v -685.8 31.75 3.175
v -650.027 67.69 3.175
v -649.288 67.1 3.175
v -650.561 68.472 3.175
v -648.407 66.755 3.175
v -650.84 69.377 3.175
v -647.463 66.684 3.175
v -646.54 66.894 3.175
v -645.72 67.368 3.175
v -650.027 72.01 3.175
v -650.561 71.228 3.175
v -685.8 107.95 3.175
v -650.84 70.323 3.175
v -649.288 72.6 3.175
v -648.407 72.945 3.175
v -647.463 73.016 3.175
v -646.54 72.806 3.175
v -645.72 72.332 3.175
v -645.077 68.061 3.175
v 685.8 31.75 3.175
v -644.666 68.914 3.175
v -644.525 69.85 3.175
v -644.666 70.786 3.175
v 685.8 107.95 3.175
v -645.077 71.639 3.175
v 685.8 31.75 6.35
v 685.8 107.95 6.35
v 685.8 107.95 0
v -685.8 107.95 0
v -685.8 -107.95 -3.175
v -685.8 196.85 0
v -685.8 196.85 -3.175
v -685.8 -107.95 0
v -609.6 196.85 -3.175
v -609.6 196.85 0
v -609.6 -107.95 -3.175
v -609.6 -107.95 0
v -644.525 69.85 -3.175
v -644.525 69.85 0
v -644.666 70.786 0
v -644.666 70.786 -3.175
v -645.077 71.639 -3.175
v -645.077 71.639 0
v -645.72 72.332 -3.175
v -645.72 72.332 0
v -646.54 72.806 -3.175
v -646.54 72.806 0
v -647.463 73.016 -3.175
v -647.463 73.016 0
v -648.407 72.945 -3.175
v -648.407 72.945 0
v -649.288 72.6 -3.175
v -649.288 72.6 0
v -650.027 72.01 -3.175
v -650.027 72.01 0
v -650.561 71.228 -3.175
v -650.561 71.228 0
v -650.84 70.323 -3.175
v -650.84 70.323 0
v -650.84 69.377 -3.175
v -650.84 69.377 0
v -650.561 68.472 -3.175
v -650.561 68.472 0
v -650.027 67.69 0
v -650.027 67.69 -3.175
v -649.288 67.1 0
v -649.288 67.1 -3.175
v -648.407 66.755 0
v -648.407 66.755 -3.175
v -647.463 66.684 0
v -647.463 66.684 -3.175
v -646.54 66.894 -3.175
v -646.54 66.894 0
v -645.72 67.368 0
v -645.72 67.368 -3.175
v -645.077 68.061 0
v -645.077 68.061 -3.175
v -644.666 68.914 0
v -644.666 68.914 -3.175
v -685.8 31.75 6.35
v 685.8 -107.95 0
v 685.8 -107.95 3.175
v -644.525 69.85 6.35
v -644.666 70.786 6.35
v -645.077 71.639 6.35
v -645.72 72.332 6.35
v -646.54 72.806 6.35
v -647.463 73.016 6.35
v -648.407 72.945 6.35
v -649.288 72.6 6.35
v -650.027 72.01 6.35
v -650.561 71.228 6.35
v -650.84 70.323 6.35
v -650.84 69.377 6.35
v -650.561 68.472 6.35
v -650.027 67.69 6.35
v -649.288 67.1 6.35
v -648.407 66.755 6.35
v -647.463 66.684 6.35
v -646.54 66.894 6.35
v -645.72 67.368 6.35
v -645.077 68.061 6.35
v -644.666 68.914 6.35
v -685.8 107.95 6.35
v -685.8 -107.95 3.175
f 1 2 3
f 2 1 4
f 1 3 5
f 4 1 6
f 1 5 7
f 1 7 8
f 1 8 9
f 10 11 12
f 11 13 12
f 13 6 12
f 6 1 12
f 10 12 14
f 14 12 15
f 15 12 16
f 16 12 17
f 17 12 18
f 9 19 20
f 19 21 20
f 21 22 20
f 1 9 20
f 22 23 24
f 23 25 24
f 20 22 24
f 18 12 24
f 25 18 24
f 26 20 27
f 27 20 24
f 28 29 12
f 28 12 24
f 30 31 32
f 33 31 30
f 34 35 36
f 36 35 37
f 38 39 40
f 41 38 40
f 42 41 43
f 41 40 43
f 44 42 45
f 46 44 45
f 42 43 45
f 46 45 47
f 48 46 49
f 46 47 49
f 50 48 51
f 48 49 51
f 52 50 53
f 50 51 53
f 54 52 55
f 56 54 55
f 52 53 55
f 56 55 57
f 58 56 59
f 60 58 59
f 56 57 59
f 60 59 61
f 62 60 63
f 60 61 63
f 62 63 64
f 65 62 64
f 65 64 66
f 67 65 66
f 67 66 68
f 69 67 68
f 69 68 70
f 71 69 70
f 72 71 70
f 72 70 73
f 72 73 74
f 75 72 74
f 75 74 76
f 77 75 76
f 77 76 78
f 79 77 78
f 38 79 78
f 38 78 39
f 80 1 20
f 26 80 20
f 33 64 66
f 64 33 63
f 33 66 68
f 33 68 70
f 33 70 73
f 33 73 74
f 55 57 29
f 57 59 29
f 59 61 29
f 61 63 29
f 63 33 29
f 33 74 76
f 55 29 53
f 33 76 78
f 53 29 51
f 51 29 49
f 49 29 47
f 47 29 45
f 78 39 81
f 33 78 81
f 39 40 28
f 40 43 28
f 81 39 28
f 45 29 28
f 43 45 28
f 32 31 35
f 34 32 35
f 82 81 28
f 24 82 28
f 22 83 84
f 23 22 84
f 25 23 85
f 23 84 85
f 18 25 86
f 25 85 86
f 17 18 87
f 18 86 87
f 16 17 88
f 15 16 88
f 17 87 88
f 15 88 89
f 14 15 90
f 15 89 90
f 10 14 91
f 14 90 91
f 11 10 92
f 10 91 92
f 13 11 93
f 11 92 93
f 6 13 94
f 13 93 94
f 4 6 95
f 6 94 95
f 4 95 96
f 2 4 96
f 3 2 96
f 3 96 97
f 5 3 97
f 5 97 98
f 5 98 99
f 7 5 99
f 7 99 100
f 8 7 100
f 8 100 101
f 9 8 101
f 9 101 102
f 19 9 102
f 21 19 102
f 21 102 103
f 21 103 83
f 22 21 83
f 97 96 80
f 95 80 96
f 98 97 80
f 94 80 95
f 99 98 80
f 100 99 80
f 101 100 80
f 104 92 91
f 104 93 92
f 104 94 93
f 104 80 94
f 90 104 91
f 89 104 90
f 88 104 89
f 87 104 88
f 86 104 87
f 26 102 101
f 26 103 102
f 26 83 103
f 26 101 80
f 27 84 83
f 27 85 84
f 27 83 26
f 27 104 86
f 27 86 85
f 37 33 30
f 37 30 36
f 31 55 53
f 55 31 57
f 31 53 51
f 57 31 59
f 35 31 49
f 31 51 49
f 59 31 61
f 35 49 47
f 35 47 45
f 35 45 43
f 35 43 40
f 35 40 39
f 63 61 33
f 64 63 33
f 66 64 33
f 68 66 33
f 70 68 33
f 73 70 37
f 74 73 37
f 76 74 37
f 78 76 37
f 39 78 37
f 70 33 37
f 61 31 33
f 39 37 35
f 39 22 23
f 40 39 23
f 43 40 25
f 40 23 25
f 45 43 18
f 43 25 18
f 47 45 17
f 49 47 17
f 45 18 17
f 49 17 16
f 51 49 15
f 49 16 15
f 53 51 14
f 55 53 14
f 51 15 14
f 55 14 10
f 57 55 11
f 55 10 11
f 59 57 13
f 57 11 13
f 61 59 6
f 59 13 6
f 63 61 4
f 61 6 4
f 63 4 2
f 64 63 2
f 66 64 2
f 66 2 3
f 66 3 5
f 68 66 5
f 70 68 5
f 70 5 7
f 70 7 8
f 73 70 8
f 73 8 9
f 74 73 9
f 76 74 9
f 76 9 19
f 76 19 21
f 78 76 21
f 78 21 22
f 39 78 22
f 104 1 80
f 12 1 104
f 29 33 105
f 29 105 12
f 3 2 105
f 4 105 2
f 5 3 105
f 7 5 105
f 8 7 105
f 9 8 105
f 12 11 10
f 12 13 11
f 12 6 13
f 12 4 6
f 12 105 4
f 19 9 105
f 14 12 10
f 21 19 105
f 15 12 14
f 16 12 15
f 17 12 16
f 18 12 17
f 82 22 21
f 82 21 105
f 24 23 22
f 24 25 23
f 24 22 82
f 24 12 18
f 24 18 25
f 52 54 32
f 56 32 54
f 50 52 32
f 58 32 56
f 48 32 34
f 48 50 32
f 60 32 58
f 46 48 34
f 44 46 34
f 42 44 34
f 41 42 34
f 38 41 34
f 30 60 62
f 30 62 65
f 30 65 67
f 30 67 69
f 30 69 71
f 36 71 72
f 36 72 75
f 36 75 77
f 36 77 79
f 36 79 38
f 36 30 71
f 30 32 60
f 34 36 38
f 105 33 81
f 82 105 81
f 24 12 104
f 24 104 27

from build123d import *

# Parameters (mm, degrees)
F0_W     = 1371.6
F0_H     = 215.9
F1_DEPTH = 3.175
F2_W     = 1371.6
F2_H     = 76.2
F3_DEPTH = 3.175
F4_W     = 76.2
F4_H     = 304.8
F5_DEPTH = 3.175
F6_R     = 3.175
F8_DEPTH = 9.526


with BuildPart() as f1:
    # F0 (on Top) → F1 (new body)
    with BuildSketch(Plane.XY):
        Rectangle(F0_W, F0_H)
    extrude(amount=F1_DEPTH)


with BuildPart() as f3:
    # F2 (on face) → F3 (new body)
    with BuildSketch(Plane.XY.offset(3.175)):
        with Locations((0, 69.85)):
            Rectangle(F2_W, F2_H)
    extrude(amount=F3_DEPTH)


with BuildPart() as f5:
    # F4 (on face) → F5 (new body)
    with BuildSketch(Plane(origin=(0, 0, 0), x_dir=(1, 0, 0), z_dir=(0, 0, -1))):
        with Locations((-647.7, -44.45)):
            Rectangle(F4_W, F4_H)
    extrude(amount=F5_DEPTH)


with BuildPart() as f8_tool:
    # F6 (on face) → F8 (new body, through all)
    with BuildSketch(Plane.XY.offset(6.35)):
        with Locations((-647.7, 69.85)):
            Circle(F6_R)
    extrude(amount=-F8_DEPTH)


with BuildPart() as f1_1:
    add(f1.part)

    # F8: cut by f8_tool
    add(f8_tool.part, mode=Mode.SUBTRACT)


with BuildPart() as f3_1:
    add(f3.part)

    # F8: cut by f8_tool
    add(f8_tool.part, mode=Mode.SUBTRACT)


with BuildPart() as f5_1:
    add(f5.part)

    # F8: cut by f8_tool
    add(f8_tool.part, mode=Mode.SUBTRACT)


solid = Compound([f1_1.part, f3_1.part, f5_1.part])
